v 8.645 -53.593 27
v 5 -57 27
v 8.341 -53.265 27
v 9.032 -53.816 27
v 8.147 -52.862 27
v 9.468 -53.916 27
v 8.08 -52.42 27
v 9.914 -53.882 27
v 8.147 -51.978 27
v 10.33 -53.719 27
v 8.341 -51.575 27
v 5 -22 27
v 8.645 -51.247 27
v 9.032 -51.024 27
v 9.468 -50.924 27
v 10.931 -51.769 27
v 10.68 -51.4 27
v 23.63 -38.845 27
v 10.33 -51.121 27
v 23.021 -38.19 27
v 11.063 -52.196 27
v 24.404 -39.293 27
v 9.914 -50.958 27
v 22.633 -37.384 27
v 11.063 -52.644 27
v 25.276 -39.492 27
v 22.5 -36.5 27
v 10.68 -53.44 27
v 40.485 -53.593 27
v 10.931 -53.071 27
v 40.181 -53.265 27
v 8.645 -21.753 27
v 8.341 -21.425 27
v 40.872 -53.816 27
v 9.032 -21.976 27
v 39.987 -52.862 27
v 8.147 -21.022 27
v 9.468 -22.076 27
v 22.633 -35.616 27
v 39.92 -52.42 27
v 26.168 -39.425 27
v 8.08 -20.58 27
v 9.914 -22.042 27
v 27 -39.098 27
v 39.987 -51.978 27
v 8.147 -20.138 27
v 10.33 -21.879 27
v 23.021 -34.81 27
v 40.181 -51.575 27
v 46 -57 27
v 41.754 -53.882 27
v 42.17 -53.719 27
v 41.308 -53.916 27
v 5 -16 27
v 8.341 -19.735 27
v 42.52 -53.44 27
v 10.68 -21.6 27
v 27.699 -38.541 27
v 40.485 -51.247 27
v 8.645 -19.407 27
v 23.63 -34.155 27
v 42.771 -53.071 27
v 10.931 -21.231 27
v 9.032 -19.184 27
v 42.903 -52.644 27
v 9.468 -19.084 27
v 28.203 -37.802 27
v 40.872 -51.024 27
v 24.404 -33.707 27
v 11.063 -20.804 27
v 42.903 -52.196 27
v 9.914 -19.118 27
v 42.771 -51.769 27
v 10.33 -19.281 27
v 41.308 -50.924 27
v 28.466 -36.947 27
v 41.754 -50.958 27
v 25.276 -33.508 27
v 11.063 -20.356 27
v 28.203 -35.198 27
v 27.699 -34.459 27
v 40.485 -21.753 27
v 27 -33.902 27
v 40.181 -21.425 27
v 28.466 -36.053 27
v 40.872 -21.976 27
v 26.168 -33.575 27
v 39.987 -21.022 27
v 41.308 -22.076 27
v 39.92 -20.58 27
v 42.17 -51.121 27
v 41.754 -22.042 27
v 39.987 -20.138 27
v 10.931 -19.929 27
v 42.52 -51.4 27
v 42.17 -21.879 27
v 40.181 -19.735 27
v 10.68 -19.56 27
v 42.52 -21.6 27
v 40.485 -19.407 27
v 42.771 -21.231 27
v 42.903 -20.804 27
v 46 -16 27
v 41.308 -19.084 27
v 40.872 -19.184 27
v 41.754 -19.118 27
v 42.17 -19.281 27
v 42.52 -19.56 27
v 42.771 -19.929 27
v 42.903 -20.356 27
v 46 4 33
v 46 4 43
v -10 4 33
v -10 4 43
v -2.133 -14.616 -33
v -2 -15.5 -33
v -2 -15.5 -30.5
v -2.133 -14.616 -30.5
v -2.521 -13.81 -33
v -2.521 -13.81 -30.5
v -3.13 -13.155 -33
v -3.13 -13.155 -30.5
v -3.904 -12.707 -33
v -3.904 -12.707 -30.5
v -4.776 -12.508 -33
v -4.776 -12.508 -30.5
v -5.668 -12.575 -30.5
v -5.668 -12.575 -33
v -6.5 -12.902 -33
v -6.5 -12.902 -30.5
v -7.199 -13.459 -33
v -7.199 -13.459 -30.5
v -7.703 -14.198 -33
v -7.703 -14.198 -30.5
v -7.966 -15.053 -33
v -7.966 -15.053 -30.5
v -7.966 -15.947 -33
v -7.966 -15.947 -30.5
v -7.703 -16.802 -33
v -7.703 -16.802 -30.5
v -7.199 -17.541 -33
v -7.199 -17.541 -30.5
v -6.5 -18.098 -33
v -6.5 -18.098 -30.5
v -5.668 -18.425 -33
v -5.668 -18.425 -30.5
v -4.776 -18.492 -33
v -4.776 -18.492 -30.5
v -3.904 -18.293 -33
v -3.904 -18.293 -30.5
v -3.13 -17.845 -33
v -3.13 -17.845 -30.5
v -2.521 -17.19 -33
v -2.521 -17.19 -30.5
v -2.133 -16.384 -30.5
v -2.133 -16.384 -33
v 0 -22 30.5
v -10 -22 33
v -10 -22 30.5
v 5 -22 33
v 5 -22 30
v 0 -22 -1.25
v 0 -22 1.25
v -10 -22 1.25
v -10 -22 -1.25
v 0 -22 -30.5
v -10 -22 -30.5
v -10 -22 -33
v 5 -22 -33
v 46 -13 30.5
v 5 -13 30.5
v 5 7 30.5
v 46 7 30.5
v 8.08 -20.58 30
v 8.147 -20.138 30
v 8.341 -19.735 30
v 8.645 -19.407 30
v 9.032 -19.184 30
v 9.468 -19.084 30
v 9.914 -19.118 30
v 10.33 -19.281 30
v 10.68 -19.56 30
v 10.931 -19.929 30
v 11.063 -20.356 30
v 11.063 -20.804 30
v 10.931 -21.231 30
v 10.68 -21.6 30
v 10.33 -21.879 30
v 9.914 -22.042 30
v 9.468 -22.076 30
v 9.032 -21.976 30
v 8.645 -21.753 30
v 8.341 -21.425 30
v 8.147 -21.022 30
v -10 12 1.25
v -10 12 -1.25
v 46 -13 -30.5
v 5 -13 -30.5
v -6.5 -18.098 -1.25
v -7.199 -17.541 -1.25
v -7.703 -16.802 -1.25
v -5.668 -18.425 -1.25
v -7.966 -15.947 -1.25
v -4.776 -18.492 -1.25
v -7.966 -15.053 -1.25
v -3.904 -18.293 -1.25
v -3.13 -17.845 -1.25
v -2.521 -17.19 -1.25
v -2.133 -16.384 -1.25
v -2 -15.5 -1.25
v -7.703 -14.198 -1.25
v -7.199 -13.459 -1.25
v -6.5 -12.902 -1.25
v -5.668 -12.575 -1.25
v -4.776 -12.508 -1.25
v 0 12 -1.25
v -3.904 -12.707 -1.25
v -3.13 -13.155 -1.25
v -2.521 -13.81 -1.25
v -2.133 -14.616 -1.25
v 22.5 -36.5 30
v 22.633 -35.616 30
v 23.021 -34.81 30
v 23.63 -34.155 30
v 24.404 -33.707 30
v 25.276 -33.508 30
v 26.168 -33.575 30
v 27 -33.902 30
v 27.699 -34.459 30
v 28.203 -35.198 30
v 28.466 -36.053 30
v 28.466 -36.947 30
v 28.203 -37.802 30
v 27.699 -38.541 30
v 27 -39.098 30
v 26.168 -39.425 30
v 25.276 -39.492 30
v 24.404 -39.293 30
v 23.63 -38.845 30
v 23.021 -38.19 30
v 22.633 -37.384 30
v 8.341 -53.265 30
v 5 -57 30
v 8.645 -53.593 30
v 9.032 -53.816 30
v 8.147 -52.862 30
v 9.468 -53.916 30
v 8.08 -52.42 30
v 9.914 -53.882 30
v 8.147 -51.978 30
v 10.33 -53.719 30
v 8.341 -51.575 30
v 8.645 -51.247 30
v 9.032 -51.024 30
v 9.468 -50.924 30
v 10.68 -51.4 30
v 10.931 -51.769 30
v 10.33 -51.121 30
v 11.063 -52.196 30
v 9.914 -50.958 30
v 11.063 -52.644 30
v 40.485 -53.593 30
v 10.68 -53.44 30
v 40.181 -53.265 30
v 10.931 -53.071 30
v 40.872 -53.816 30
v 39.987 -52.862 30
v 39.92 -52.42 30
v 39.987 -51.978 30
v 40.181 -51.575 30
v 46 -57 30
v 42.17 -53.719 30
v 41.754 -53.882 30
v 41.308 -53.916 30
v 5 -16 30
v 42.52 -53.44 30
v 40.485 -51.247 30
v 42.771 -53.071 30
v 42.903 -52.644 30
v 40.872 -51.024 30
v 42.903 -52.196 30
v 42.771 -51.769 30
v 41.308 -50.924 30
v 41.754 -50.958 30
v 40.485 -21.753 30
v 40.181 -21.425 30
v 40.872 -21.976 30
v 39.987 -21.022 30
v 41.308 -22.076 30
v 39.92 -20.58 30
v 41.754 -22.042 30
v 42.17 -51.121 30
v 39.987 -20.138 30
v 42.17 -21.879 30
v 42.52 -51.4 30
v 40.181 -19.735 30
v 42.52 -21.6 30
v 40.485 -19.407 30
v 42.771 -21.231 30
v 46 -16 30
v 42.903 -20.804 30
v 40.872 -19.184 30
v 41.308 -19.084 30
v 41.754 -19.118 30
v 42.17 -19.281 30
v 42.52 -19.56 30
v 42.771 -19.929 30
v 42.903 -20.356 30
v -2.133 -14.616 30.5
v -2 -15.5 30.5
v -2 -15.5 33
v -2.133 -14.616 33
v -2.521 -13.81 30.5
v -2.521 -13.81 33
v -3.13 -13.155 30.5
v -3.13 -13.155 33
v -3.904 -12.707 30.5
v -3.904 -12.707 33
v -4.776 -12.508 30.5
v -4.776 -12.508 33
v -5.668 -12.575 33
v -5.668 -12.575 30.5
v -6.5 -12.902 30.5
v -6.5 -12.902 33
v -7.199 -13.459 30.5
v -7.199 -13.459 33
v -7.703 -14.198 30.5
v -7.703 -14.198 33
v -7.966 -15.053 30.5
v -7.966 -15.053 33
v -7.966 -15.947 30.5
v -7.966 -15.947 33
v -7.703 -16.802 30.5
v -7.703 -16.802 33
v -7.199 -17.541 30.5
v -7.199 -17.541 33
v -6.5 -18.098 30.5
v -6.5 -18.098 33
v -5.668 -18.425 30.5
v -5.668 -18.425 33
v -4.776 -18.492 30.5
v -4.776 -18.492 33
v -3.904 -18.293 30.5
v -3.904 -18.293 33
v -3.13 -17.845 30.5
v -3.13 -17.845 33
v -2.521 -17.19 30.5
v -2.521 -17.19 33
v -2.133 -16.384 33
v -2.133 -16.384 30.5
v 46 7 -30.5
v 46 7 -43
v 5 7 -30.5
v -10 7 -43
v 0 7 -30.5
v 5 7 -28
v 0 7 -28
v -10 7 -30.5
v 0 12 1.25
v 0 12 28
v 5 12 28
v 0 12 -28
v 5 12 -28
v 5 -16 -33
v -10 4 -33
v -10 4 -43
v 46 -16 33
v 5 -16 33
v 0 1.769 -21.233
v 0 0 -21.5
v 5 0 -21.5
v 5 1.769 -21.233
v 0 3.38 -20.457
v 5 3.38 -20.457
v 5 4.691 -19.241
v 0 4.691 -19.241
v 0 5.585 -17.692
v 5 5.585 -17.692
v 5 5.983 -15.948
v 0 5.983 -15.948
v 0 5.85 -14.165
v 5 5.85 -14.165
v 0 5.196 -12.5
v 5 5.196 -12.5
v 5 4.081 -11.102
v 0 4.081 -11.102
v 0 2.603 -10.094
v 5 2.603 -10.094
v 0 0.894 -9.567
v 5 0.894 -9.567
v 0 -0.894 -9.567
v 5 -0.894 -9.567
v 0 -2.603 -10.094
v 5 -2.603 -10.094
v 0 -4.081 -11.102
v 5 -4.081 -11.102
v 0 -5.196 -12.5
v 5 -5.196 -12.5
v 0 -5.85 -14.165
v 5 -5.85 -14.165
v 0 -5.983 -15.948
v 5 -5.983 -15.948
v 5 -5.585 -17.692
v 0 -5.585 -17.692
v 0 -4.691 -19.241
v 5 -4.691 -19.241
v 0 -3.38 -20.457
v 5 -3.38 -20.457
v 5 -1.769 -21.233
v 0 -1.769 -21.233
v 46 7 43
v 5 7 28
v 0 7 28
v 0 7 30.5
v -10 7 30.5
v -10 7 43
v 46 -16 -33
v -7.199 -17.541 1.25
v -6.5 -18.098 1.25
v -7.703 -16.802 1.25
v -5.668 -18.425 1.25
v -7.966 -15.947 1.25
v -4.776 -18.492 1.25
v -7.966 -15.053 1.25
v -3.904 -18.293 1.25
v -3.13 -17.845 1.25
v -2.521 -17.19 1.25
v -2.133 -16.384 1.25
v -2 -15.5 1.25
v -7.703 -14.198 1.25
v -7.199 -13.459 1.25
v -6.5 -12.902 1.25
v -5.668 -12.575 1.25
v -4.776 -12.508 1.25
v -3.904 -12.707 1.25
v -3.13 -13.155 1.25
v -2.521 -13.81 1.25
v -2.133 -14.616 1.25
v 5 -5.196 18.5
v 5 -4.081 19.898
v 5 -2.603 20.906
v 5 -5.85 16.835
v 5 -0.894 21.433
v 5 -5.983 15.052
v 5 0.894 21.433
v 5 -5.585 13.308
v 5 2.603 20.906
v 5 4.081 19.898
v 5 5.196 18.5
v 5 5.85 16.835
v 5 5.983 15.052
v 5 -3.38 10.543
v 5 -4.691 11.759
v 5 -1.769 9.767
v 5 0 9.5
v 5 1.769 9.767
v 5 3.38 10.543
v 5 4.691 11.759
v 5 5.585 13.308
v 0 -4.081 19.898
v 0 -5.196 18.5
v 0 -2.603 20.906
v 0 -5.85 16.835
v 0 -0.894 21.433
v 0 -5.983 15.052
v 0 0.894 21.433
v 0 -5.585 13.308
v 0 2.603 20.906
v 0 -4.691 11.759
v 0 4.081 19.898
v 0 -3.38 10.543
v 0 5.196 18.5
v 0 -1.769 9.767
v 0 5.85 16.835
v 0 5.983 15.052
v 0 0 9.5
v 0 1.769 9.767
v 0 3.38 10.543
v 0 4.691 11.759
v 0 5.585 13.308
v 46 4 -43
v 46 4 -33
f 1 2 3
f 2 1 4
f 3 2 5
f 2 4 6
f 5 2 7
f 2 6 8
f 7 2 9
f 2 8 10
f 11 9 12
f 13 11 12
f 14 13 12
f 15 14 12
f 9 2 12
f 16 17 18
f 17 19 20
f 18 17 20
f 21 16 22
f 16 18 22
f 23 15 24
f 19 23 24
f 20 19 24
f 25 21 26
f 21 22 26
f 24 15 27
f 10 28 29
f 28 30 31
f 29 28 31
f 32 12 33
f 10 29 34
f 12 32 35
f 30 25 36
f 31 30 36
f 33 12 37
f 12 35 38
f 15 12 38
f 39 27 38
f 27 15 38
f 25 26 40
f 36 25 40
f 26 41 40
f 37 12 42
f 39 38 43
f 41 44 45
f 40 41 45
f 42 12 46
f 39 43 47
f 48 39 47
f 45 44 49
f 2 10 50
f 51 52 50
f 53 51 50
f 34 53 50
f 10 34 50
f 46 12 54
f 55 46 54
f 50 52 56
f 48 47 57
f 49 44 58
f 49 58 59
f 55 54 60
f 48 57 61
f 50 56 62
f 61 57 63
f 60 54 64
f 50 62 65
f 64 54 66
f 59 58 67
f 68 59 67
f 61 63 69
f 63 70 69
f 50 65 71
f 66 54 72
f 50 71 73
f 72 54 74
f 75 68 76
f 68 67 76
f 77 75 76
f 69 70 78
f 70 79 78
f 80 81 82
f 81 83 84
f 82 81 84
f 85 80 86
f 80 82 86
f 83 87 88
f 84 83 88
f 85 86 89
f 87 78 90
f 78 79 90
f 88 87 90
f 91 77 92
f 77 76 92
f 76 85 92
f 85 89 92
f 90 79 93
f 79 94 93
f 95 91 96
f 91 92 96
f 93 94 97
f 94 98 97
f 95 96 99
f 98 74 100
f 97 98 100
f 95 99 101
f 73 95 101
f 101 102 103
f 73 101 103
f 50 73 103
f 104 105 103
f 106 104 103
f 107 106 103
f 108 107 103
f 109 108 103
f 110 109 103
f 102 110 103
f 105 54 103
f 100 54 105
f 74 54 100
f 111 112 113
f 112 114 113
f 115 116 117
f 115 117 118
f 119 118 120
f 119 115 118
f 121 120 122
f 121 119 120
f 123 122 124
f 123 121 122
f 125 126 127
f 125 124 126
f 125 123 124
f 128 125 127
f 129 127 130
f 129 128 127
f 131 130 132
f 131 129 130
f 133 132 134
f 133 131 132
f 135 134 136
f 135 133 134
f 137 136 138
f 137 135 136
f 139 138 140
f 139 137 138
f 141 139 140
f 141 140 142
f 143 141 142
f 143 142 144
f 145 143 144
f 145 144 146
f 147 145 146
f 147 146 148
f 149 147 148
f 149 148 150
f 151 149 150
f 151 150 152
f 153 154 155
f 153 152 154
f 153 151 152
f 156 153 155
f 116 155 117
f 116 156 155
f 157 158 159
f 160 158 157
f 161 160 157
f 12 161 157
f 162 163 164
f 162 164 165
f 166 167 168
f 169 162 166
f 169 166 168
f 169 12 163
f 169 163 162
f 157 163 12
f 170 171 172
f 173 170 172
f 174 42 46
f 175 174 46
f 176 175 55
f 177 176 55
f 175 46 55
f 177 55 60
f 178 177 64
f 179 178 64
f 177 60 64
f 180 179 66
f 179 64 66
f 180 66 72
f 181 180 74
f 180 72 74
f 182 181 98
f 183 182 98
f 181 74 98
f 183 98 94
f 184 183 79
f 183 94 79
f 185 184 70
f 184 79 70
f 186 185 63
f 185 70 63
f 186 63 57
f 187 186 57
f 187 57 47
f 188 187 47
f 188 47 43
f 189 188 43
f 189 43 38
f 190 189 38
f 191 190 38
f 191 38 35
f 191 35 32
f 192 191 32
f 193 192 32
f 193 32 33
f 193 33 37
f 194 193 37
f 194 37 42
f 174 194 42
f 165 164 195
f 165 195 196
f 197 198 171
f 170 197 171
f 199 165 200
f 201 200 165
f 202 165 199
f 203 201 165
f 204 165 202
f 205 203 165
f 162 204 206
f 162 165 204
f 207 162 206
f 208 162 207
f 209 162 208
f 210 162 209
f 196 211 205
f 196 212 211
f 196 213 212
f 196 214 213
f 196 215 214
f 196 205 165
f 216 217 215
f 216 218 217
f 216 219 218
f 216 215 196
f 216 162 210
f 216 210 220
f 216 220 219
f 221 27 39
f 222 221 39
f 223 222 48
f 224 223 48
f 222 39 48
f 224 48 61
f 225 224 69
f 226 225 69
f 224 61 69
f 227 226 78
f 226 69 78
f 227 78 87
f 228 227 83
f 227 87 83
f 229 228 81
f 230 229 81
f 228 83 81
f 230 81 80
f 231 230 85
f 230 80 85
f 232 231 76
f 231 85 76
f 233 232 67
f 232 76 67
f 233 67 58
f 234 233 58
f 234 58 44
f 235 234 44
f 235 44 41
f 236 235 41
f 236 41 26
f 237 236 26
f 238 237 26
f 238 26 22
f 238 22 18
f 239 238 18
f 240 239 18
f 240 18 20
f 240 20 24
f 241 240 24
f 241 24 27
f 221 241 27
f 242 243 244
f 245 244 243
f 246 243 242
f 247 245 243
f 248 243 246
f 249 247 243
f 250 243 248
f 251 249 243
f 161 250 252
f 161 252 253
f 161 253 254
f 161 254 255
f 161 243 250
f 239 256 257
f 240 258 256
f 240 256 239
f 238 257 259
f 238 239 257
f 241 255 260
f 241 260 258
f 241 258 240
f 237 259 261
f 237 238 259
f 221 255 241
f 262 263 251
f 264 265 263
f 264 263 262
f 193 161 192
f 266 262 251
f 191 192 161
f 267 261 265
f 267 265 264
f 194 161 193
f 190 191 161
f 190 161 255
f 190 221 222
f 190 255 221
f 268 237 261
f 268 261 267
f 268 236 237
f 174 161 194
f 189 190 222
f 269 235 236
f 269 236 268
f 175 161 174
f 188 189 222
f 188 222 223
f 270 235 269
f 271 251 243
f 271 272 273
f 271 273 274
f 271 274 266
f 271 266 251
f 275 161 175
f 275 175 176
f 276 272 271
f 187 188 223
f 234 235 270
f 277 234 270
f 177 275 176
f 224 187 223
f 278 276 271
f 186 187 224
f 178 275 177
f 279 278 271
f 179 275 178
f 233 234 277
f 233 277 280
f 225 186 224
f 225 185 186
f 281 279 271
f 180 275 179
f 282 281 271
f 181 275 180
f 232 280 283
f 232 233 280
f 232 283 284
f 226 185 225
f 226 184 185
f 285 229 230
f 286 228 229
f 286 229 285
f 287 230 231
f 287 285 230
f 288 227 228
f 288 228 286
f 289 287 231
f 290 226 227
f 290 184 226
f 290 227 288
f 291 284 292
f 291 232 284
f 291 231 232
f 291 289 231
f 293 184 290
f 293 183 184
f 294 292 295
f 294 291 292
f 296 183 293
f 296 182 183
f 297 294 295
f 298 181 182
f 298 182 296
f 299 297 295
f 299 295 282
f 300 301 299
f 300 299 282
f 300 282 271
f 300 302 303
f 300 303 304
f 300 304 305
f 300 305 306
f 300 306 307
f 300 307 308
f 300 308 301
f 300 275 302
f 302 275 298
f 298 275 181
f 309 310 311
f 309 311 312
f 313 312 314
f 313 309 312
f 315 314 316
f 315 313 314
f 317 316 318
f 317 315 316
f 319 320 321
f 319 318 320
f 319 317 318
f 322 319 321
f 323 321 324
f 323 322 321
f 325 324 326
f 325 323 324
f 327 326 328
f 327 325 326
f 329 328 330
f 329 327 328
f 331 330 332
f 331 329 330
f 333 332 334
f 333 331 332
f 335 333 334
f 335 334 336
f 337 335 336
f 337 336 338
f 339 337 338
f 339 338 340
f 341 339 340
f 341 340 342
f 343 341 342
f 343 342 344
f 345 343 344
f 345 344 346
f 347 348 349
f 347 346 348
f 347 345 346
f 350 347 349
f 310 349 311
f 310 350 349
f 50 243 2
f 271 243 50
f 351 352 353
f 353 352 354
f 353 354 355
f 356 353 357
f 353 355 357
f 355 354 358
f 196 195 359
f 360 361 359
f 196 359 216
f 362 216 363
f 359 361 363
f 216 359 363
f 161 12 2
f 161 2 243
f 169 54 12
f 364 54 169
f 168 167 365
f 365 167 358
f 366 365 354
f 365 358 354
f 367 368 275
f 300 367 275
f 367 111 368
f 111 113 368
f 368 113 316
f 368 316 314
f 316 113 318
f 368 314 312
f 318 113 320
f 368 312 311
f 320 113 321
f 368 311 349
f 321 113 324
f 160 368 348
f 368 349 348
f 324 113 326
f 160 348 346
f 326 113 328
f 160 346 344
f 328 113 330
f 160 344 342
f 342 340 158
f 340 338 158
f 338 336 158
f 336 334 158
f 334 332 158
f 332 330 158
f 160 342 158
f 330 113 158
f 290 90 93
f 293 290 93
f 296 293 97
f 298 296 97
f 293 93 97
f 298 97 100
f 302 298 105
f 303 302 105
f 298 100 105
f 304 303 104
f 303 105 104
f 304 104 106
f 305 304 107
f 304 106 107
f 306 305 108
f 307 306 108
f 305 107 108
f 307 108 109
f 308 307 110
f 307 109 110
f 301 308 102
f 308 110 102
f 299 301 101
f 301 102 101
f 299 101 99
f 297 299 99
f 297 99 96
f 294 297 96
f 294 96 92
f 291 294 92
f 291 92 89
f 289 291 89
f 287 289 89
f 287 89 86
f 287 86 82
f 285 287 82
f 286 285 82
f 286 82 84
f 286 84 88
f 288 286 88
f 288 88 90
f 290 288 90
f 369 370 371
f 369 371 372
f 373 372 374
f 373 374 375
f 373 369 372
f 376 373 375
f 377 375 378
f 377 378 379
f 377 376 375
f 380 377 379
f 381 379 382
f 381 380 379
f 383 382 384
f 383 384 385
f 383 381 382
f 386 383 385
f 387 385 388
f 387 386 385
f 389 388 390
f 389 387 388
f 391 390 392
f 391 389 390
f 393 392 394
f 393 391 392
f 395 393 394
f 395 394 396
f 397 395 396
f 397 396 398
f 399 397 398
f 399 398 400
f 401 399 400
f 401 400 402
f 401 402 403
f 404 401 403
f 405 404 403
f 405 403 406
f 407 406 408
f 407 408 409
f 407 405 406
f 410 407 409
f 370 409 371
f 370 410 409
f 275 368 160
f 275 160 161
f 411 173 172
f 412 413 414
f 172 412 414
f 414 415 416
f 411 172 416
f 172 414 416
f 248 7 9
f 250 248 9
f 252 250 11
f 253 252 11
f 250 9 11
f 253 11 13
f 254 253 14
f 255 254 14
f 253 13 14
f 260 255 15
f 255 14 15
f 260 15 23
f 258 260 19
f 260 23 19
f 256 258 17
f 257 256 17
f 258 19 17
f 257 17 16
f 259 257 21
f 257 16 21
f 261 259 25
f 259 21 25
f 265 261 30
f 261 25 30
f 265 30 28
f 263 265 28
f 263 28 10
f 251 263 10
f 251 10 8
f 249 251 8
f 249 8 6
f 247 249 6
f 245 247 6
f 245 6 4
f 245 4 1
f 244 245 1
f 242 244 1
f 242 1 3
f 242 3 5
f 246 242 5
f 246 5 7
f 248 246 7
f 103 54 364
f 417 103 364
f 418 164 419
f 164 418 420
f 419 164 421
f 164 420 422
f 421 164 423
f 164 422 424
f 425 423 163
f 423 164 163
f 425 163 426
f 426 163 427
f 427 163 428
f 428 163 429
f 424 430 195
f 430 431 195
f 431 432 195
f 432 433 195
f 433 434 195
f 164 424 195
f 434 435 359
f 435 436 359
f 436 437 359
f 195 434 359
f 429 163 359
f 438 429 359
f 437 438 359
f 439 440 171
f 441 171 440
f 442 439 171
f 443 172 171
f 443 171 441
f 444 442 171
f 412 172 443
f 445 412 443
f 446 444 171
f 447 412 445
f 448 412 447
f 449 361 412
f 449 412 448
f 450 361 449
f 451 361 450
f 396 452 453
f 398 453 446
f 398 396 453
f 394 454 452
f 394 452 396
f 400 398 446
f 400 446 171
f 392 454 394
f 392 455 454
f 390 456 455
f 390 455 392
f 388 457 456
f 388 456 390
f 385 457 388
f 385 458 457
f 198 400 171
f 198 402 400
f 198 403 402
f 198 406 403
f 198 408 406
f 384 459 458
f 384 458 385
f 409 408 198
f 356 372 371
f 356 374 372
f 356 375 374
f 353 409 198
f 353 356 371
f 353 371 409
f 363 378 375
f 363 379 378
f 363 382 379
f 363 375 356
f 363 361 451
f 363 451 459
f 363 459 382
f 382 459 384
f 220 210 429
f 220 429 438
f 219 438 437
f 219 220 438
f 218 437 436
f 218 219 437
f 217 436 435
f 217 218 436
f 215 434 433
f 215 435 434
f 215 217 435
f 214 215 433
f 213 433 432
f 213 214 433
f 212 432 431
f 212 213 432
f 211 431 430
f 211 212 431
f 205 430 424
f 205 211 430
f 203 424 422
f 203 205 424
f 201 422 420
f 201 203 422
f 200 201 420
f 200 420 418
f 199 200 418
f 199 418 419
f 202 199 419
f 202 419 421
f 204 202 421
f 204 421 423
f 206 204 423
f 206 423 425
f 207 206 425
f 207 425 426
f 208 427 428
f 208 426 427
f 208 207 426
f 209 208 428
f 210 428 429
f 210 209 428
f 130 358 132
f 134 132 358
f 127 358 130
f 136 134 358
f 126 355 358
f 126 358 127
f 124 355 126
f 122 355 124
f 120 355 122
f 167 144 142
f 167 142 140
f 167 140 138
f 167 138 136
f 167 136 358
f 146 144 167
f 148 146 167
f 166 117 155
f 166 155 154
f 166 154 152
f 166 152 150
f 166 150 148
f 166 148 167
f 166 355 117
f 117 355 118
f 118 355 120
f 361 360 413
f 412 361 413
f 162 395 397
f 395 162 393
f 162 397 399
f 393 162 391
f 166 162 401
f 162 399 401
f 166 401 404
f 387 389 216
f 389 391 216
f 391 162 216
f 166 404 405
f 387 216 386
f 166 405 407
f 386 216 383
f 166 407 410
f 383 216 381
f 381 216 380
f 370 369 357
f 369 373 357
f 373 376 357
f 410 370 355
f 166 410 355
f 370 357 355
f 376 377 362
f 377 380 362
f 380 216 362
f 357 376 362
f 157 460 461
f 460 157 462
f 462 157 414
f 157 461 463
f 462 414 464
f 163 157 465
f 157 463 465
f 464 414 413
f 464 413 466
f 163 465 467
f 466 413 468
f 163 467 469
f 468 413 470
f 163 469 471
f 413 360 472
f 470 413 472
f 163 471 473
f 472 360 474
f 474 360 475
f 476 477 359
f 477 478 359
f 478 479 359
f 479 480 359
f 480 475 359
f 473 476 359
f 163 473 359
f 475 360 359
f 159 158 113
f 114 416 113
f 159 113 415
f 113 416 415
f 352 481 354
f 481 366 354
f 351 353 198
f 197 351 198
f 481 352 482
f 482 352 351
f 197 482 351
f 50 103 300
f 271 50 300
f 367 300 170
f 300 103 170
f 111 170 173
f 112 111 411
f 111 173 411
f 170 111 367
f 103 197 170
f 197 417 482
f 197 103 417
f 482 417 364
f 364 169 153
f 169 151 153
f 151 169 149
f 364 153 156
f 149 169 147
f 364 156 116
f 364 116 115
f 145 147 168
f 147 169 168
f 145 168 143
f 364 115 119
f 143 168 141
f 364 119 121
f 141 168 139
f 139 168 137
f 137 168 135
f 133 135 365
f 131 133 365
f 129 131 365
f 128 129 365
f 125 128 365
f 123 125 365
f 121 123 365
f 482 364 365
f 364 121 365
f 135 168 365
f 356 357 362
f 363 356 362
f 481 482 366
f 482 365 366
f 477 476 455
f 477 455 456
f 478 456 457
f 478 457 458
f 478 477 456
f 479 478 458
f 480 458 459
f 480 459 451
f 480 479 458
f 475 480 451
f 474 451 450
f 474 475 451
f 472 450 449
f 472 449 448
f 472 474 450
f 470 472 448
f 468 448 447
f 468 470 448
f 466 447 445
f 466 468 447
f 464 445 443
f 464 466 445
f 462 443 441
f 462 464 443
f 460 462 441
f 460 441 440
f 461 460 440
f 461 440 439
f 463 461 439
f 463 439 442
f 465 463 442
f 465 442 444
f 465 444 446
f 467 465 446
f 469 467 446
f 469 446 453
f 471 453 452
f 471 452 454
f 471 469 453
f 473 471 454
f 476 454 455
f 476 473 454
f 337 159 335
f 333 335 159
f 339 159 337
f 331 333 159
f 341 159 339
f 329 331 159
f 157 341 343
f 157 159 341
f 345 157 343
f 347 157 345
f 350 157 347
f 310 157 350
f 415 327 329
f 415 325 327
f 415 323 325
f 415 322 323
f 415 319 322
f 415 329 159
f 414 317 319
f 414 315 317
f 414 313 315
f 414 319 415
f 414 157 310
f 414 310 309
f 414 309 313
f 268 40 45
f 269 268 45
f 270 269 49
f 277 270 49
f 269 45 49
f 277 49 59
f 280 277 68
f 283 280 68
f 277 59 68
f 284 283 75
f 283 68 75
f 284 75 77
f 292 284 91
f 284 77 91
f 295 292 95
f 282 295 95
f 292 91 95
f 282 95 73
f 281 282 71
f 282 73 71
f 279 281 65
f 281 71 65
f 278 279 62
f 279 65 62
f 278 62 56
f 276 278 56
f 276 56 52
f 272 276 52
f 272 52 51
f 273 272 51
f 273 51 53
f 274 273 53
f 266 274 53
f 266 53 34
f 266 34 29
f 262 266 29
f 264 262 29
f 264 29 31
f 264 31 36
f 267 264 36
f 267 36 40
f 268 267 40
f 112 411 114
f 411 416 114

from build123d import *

# Parameters (mm, degrees)
SKETCH1_R               = 6
BOSS_EXTRUDE1_DEPTH     = 5
SKETCH1_W               = 66
SKETCH1_H               = 6
BOSS_EXTRUDE1_2_DEPTH   = 5
SKETCH1_4_W             = 2.5
SKETCH1_4_H             = 34
BOSS_EXTRUDE2_DEPTH     = 10
CUT_EXTRUDE1_DEPTH      = 51.418870475
CUT_EXTRUDE1_DEPTH_BACK = 51.418870475
SKETCH2_R               = 3
BOSS_EXTRUDE3_DEPTH     = 46
SKETCH3_W               = 41
SKETCH3_H               = 3
BOSS_EXTRUDE4_DEPTH     = 41
SKETCH4_R               = 3
SKETCH4_R_2             = 1.5
CUT_EXTRUDE2_DEPTH      = 6


with BuildPart() as part:
    # Sketch1 → Boss-Extrude1 (new body)
    with BuildSketch(Plane(origin=(0, 0, 0), x_dir=(0, 0, -1), z_dir=(1, 0, 0))):
        Polygon((-28, 12), (-28, 7), (-30.5, 7), (-30.5, -13), (30.5, -13), (30.5, 7), (28, 7), (28, 12), align=None)
        with Locations((-15.5, 0)):
            Circle(SKETCH1_R, mode=Mode.SUBTRACT)
        with Locations((15.5, 0)):
            Circle(SKETCH1_R, mode=Mode.SUBTRACT)
    extrude(amount=BOSS_EXTRUDE1_DEPTH)

    # Sketch1<4> → Boss-Extrude2 (add)
    with BuildSketch(Plane(origin=(0, 0, 0), x_dir=(0, 0, -1), z_dir=(1, 0, 0))):
        with Locations((0, -5)):
            Rectangle(SKETCH1_4_W, SKETCH1_4_H)
        Polygon((-33, 4), (-33, -22), (-30.5, -22), (-30.5, 7), (-43, 7), (-43, 4), align=None)
        Polygon((30.5, -22), (33, -22), (33, 4), (43, 4), (43, 7), (30.5, 7), align=None)
    extrude(amount=-BOSS_EXTRUDE2_DEPTH)


with BuildPart() as body_2:
    # Sketch1 → Boss-Extrude1 2 (new body)
    with BuildSketch(Plane(origin=(0, 0, 0), x_dir=(0, 0, -1), z_dir=(1, 0, 0))):
        with Locations((0, -19)):
            Rectangle(SKETCH1_W, SKETCH1_H)
    extrude(amount=BOSS_EXTRUDE1_2_DEPTH)



with BuildPart() as boss_extrude2_piece_1:
    # of the separate pieces the step leaves, piece 1, a body of its own (boss_extrude2_pieces)
    add(part.part.solids().sort_by_distance((0, 7, -28))[0])


with BuildPart() as boss_extrude2_piece_2:
    # of the separate pieces the step leaves, piece 2, a body of its own (boss_extrude2_pieces)
    add(part.part.solids().sort_by_distance((0, -22, 30.5))[0])


with BuildPart() as boss_extrude2_piece_3:
    # of the separate pieces the step leaves, piece 3, a body of its own (boss_extrude2_pieces)
    add(part.part.solids().sort_by_distance((-10, 7, -30.5))[0])


with BuildPart() as cut_extrude1_tool:
    # Sketch2 → Cut-Extrude1 (new, two sides: drawn at the far end of the back side and taken through both)
    with BuildSketch(Plane.XY.offset(1.25).offset(-CUT_EXTRUDE1_DEPTH_BACK)):
        with Locations((-5, -15.5)):
            Circle(SKETCH2_R)
    extrude(amount=CUT_EXTRUDE1_DEPTH + CUT_EXTRUDE1_DEPTH_BACK)


with BuildPart() as boss_extrude2_piece_1_1:
    add(boss_extrude2_piece_1.part)

    # Cut-Extrude1: cut by cut_extrude1_tool
    add(cut_extrude1_tool.part, mode=Mode.SUBTRACT)


with BuildPart() as boss_extrude2_piece_2_1:
    add(boss_extrude2_piece_2.part)

    # Cut-Extrude1: cut by cut_extrude1_tool
    add(cut_extrude1_tool.part, mode=Mode.SUBTRACT)


with BuildPart() as boss_extrude2_piece_3_1:
    add(boss_extrude2_piece_3.part)

    # Cut-Extrude1: cut by cut_extrude1_tool
    add(cut_extrude1_tool.part, mode=Mode.SUBTRACT)


with BuildPart() as body_2_1:
    add(body_2.part)

    add(boss_extrude2_piece_1_1.part)  # Boss-Extrude3 merges Boss-Extrude2 piece 1

    add(boss_extrude2_piece_2_1.part)  # Boss-Extrude3 merges Boss-Extrude2 piece 2

    add(boss_extrude2_piece_3_1.part)  # Boss-Extrude3 merges Boss-Extrude2 piece 3
    # Sketch1<6> → Boss-Extrude3 (add)
    with BuildSketch(Plane(origin=(0, 0, 0), x_dir=(0, 0, -1), z_dir=(1, 0, 0))):
        Polygon((-30.5, -13), (-30.5, 7), (-43, 7), (-43, 4), (-33, 4), (-33, -16), (33, -16), (33, 4), (43, 4), (43, 7), (30.5, 7), (30.5, -13), align=None)
    extrude(amount=BOSS_EXTRUDE3_DEPTH)

    # Sketch3 → Boss-Extrude4 (add)
    with BuildSketch(Plane.XZ.offset(16)):
        with Locations((25.5, 28.5)):
            Rectangle(SKETCH3_W, SKETCH3_H)
    extrude(amount=BOSS_EXTRUDE4_DEPTH)

    # Sketch4 → Cut-Extrude2 (cut)
    with BuildSketch(Plane(origin=(0, 0, 27), x_dir=(-1, 0, 0), z_dir=(0, 0, -1))):
        with Locations((-25.5, -36.5)):
            Circle(SKETCH4_R)
        with Locations((-41.42, -20.58)):
            Circle(SKETCH4_R_2)
        with Locations((-9.58, -20.58)):
            Circle(SKETCH4_R_2)
        with Locations((-9.58, -52.42)):
            Circle(SKETCH4_R_2)
        with Locations((-41.42, -52.42)):
            Circle(SKETCH4_R_2)
    extrude(amount=-CUT_EXTRUDE2_DEPTH, mode=Mode.SUBTRACT)


solid = body_2_1.part
